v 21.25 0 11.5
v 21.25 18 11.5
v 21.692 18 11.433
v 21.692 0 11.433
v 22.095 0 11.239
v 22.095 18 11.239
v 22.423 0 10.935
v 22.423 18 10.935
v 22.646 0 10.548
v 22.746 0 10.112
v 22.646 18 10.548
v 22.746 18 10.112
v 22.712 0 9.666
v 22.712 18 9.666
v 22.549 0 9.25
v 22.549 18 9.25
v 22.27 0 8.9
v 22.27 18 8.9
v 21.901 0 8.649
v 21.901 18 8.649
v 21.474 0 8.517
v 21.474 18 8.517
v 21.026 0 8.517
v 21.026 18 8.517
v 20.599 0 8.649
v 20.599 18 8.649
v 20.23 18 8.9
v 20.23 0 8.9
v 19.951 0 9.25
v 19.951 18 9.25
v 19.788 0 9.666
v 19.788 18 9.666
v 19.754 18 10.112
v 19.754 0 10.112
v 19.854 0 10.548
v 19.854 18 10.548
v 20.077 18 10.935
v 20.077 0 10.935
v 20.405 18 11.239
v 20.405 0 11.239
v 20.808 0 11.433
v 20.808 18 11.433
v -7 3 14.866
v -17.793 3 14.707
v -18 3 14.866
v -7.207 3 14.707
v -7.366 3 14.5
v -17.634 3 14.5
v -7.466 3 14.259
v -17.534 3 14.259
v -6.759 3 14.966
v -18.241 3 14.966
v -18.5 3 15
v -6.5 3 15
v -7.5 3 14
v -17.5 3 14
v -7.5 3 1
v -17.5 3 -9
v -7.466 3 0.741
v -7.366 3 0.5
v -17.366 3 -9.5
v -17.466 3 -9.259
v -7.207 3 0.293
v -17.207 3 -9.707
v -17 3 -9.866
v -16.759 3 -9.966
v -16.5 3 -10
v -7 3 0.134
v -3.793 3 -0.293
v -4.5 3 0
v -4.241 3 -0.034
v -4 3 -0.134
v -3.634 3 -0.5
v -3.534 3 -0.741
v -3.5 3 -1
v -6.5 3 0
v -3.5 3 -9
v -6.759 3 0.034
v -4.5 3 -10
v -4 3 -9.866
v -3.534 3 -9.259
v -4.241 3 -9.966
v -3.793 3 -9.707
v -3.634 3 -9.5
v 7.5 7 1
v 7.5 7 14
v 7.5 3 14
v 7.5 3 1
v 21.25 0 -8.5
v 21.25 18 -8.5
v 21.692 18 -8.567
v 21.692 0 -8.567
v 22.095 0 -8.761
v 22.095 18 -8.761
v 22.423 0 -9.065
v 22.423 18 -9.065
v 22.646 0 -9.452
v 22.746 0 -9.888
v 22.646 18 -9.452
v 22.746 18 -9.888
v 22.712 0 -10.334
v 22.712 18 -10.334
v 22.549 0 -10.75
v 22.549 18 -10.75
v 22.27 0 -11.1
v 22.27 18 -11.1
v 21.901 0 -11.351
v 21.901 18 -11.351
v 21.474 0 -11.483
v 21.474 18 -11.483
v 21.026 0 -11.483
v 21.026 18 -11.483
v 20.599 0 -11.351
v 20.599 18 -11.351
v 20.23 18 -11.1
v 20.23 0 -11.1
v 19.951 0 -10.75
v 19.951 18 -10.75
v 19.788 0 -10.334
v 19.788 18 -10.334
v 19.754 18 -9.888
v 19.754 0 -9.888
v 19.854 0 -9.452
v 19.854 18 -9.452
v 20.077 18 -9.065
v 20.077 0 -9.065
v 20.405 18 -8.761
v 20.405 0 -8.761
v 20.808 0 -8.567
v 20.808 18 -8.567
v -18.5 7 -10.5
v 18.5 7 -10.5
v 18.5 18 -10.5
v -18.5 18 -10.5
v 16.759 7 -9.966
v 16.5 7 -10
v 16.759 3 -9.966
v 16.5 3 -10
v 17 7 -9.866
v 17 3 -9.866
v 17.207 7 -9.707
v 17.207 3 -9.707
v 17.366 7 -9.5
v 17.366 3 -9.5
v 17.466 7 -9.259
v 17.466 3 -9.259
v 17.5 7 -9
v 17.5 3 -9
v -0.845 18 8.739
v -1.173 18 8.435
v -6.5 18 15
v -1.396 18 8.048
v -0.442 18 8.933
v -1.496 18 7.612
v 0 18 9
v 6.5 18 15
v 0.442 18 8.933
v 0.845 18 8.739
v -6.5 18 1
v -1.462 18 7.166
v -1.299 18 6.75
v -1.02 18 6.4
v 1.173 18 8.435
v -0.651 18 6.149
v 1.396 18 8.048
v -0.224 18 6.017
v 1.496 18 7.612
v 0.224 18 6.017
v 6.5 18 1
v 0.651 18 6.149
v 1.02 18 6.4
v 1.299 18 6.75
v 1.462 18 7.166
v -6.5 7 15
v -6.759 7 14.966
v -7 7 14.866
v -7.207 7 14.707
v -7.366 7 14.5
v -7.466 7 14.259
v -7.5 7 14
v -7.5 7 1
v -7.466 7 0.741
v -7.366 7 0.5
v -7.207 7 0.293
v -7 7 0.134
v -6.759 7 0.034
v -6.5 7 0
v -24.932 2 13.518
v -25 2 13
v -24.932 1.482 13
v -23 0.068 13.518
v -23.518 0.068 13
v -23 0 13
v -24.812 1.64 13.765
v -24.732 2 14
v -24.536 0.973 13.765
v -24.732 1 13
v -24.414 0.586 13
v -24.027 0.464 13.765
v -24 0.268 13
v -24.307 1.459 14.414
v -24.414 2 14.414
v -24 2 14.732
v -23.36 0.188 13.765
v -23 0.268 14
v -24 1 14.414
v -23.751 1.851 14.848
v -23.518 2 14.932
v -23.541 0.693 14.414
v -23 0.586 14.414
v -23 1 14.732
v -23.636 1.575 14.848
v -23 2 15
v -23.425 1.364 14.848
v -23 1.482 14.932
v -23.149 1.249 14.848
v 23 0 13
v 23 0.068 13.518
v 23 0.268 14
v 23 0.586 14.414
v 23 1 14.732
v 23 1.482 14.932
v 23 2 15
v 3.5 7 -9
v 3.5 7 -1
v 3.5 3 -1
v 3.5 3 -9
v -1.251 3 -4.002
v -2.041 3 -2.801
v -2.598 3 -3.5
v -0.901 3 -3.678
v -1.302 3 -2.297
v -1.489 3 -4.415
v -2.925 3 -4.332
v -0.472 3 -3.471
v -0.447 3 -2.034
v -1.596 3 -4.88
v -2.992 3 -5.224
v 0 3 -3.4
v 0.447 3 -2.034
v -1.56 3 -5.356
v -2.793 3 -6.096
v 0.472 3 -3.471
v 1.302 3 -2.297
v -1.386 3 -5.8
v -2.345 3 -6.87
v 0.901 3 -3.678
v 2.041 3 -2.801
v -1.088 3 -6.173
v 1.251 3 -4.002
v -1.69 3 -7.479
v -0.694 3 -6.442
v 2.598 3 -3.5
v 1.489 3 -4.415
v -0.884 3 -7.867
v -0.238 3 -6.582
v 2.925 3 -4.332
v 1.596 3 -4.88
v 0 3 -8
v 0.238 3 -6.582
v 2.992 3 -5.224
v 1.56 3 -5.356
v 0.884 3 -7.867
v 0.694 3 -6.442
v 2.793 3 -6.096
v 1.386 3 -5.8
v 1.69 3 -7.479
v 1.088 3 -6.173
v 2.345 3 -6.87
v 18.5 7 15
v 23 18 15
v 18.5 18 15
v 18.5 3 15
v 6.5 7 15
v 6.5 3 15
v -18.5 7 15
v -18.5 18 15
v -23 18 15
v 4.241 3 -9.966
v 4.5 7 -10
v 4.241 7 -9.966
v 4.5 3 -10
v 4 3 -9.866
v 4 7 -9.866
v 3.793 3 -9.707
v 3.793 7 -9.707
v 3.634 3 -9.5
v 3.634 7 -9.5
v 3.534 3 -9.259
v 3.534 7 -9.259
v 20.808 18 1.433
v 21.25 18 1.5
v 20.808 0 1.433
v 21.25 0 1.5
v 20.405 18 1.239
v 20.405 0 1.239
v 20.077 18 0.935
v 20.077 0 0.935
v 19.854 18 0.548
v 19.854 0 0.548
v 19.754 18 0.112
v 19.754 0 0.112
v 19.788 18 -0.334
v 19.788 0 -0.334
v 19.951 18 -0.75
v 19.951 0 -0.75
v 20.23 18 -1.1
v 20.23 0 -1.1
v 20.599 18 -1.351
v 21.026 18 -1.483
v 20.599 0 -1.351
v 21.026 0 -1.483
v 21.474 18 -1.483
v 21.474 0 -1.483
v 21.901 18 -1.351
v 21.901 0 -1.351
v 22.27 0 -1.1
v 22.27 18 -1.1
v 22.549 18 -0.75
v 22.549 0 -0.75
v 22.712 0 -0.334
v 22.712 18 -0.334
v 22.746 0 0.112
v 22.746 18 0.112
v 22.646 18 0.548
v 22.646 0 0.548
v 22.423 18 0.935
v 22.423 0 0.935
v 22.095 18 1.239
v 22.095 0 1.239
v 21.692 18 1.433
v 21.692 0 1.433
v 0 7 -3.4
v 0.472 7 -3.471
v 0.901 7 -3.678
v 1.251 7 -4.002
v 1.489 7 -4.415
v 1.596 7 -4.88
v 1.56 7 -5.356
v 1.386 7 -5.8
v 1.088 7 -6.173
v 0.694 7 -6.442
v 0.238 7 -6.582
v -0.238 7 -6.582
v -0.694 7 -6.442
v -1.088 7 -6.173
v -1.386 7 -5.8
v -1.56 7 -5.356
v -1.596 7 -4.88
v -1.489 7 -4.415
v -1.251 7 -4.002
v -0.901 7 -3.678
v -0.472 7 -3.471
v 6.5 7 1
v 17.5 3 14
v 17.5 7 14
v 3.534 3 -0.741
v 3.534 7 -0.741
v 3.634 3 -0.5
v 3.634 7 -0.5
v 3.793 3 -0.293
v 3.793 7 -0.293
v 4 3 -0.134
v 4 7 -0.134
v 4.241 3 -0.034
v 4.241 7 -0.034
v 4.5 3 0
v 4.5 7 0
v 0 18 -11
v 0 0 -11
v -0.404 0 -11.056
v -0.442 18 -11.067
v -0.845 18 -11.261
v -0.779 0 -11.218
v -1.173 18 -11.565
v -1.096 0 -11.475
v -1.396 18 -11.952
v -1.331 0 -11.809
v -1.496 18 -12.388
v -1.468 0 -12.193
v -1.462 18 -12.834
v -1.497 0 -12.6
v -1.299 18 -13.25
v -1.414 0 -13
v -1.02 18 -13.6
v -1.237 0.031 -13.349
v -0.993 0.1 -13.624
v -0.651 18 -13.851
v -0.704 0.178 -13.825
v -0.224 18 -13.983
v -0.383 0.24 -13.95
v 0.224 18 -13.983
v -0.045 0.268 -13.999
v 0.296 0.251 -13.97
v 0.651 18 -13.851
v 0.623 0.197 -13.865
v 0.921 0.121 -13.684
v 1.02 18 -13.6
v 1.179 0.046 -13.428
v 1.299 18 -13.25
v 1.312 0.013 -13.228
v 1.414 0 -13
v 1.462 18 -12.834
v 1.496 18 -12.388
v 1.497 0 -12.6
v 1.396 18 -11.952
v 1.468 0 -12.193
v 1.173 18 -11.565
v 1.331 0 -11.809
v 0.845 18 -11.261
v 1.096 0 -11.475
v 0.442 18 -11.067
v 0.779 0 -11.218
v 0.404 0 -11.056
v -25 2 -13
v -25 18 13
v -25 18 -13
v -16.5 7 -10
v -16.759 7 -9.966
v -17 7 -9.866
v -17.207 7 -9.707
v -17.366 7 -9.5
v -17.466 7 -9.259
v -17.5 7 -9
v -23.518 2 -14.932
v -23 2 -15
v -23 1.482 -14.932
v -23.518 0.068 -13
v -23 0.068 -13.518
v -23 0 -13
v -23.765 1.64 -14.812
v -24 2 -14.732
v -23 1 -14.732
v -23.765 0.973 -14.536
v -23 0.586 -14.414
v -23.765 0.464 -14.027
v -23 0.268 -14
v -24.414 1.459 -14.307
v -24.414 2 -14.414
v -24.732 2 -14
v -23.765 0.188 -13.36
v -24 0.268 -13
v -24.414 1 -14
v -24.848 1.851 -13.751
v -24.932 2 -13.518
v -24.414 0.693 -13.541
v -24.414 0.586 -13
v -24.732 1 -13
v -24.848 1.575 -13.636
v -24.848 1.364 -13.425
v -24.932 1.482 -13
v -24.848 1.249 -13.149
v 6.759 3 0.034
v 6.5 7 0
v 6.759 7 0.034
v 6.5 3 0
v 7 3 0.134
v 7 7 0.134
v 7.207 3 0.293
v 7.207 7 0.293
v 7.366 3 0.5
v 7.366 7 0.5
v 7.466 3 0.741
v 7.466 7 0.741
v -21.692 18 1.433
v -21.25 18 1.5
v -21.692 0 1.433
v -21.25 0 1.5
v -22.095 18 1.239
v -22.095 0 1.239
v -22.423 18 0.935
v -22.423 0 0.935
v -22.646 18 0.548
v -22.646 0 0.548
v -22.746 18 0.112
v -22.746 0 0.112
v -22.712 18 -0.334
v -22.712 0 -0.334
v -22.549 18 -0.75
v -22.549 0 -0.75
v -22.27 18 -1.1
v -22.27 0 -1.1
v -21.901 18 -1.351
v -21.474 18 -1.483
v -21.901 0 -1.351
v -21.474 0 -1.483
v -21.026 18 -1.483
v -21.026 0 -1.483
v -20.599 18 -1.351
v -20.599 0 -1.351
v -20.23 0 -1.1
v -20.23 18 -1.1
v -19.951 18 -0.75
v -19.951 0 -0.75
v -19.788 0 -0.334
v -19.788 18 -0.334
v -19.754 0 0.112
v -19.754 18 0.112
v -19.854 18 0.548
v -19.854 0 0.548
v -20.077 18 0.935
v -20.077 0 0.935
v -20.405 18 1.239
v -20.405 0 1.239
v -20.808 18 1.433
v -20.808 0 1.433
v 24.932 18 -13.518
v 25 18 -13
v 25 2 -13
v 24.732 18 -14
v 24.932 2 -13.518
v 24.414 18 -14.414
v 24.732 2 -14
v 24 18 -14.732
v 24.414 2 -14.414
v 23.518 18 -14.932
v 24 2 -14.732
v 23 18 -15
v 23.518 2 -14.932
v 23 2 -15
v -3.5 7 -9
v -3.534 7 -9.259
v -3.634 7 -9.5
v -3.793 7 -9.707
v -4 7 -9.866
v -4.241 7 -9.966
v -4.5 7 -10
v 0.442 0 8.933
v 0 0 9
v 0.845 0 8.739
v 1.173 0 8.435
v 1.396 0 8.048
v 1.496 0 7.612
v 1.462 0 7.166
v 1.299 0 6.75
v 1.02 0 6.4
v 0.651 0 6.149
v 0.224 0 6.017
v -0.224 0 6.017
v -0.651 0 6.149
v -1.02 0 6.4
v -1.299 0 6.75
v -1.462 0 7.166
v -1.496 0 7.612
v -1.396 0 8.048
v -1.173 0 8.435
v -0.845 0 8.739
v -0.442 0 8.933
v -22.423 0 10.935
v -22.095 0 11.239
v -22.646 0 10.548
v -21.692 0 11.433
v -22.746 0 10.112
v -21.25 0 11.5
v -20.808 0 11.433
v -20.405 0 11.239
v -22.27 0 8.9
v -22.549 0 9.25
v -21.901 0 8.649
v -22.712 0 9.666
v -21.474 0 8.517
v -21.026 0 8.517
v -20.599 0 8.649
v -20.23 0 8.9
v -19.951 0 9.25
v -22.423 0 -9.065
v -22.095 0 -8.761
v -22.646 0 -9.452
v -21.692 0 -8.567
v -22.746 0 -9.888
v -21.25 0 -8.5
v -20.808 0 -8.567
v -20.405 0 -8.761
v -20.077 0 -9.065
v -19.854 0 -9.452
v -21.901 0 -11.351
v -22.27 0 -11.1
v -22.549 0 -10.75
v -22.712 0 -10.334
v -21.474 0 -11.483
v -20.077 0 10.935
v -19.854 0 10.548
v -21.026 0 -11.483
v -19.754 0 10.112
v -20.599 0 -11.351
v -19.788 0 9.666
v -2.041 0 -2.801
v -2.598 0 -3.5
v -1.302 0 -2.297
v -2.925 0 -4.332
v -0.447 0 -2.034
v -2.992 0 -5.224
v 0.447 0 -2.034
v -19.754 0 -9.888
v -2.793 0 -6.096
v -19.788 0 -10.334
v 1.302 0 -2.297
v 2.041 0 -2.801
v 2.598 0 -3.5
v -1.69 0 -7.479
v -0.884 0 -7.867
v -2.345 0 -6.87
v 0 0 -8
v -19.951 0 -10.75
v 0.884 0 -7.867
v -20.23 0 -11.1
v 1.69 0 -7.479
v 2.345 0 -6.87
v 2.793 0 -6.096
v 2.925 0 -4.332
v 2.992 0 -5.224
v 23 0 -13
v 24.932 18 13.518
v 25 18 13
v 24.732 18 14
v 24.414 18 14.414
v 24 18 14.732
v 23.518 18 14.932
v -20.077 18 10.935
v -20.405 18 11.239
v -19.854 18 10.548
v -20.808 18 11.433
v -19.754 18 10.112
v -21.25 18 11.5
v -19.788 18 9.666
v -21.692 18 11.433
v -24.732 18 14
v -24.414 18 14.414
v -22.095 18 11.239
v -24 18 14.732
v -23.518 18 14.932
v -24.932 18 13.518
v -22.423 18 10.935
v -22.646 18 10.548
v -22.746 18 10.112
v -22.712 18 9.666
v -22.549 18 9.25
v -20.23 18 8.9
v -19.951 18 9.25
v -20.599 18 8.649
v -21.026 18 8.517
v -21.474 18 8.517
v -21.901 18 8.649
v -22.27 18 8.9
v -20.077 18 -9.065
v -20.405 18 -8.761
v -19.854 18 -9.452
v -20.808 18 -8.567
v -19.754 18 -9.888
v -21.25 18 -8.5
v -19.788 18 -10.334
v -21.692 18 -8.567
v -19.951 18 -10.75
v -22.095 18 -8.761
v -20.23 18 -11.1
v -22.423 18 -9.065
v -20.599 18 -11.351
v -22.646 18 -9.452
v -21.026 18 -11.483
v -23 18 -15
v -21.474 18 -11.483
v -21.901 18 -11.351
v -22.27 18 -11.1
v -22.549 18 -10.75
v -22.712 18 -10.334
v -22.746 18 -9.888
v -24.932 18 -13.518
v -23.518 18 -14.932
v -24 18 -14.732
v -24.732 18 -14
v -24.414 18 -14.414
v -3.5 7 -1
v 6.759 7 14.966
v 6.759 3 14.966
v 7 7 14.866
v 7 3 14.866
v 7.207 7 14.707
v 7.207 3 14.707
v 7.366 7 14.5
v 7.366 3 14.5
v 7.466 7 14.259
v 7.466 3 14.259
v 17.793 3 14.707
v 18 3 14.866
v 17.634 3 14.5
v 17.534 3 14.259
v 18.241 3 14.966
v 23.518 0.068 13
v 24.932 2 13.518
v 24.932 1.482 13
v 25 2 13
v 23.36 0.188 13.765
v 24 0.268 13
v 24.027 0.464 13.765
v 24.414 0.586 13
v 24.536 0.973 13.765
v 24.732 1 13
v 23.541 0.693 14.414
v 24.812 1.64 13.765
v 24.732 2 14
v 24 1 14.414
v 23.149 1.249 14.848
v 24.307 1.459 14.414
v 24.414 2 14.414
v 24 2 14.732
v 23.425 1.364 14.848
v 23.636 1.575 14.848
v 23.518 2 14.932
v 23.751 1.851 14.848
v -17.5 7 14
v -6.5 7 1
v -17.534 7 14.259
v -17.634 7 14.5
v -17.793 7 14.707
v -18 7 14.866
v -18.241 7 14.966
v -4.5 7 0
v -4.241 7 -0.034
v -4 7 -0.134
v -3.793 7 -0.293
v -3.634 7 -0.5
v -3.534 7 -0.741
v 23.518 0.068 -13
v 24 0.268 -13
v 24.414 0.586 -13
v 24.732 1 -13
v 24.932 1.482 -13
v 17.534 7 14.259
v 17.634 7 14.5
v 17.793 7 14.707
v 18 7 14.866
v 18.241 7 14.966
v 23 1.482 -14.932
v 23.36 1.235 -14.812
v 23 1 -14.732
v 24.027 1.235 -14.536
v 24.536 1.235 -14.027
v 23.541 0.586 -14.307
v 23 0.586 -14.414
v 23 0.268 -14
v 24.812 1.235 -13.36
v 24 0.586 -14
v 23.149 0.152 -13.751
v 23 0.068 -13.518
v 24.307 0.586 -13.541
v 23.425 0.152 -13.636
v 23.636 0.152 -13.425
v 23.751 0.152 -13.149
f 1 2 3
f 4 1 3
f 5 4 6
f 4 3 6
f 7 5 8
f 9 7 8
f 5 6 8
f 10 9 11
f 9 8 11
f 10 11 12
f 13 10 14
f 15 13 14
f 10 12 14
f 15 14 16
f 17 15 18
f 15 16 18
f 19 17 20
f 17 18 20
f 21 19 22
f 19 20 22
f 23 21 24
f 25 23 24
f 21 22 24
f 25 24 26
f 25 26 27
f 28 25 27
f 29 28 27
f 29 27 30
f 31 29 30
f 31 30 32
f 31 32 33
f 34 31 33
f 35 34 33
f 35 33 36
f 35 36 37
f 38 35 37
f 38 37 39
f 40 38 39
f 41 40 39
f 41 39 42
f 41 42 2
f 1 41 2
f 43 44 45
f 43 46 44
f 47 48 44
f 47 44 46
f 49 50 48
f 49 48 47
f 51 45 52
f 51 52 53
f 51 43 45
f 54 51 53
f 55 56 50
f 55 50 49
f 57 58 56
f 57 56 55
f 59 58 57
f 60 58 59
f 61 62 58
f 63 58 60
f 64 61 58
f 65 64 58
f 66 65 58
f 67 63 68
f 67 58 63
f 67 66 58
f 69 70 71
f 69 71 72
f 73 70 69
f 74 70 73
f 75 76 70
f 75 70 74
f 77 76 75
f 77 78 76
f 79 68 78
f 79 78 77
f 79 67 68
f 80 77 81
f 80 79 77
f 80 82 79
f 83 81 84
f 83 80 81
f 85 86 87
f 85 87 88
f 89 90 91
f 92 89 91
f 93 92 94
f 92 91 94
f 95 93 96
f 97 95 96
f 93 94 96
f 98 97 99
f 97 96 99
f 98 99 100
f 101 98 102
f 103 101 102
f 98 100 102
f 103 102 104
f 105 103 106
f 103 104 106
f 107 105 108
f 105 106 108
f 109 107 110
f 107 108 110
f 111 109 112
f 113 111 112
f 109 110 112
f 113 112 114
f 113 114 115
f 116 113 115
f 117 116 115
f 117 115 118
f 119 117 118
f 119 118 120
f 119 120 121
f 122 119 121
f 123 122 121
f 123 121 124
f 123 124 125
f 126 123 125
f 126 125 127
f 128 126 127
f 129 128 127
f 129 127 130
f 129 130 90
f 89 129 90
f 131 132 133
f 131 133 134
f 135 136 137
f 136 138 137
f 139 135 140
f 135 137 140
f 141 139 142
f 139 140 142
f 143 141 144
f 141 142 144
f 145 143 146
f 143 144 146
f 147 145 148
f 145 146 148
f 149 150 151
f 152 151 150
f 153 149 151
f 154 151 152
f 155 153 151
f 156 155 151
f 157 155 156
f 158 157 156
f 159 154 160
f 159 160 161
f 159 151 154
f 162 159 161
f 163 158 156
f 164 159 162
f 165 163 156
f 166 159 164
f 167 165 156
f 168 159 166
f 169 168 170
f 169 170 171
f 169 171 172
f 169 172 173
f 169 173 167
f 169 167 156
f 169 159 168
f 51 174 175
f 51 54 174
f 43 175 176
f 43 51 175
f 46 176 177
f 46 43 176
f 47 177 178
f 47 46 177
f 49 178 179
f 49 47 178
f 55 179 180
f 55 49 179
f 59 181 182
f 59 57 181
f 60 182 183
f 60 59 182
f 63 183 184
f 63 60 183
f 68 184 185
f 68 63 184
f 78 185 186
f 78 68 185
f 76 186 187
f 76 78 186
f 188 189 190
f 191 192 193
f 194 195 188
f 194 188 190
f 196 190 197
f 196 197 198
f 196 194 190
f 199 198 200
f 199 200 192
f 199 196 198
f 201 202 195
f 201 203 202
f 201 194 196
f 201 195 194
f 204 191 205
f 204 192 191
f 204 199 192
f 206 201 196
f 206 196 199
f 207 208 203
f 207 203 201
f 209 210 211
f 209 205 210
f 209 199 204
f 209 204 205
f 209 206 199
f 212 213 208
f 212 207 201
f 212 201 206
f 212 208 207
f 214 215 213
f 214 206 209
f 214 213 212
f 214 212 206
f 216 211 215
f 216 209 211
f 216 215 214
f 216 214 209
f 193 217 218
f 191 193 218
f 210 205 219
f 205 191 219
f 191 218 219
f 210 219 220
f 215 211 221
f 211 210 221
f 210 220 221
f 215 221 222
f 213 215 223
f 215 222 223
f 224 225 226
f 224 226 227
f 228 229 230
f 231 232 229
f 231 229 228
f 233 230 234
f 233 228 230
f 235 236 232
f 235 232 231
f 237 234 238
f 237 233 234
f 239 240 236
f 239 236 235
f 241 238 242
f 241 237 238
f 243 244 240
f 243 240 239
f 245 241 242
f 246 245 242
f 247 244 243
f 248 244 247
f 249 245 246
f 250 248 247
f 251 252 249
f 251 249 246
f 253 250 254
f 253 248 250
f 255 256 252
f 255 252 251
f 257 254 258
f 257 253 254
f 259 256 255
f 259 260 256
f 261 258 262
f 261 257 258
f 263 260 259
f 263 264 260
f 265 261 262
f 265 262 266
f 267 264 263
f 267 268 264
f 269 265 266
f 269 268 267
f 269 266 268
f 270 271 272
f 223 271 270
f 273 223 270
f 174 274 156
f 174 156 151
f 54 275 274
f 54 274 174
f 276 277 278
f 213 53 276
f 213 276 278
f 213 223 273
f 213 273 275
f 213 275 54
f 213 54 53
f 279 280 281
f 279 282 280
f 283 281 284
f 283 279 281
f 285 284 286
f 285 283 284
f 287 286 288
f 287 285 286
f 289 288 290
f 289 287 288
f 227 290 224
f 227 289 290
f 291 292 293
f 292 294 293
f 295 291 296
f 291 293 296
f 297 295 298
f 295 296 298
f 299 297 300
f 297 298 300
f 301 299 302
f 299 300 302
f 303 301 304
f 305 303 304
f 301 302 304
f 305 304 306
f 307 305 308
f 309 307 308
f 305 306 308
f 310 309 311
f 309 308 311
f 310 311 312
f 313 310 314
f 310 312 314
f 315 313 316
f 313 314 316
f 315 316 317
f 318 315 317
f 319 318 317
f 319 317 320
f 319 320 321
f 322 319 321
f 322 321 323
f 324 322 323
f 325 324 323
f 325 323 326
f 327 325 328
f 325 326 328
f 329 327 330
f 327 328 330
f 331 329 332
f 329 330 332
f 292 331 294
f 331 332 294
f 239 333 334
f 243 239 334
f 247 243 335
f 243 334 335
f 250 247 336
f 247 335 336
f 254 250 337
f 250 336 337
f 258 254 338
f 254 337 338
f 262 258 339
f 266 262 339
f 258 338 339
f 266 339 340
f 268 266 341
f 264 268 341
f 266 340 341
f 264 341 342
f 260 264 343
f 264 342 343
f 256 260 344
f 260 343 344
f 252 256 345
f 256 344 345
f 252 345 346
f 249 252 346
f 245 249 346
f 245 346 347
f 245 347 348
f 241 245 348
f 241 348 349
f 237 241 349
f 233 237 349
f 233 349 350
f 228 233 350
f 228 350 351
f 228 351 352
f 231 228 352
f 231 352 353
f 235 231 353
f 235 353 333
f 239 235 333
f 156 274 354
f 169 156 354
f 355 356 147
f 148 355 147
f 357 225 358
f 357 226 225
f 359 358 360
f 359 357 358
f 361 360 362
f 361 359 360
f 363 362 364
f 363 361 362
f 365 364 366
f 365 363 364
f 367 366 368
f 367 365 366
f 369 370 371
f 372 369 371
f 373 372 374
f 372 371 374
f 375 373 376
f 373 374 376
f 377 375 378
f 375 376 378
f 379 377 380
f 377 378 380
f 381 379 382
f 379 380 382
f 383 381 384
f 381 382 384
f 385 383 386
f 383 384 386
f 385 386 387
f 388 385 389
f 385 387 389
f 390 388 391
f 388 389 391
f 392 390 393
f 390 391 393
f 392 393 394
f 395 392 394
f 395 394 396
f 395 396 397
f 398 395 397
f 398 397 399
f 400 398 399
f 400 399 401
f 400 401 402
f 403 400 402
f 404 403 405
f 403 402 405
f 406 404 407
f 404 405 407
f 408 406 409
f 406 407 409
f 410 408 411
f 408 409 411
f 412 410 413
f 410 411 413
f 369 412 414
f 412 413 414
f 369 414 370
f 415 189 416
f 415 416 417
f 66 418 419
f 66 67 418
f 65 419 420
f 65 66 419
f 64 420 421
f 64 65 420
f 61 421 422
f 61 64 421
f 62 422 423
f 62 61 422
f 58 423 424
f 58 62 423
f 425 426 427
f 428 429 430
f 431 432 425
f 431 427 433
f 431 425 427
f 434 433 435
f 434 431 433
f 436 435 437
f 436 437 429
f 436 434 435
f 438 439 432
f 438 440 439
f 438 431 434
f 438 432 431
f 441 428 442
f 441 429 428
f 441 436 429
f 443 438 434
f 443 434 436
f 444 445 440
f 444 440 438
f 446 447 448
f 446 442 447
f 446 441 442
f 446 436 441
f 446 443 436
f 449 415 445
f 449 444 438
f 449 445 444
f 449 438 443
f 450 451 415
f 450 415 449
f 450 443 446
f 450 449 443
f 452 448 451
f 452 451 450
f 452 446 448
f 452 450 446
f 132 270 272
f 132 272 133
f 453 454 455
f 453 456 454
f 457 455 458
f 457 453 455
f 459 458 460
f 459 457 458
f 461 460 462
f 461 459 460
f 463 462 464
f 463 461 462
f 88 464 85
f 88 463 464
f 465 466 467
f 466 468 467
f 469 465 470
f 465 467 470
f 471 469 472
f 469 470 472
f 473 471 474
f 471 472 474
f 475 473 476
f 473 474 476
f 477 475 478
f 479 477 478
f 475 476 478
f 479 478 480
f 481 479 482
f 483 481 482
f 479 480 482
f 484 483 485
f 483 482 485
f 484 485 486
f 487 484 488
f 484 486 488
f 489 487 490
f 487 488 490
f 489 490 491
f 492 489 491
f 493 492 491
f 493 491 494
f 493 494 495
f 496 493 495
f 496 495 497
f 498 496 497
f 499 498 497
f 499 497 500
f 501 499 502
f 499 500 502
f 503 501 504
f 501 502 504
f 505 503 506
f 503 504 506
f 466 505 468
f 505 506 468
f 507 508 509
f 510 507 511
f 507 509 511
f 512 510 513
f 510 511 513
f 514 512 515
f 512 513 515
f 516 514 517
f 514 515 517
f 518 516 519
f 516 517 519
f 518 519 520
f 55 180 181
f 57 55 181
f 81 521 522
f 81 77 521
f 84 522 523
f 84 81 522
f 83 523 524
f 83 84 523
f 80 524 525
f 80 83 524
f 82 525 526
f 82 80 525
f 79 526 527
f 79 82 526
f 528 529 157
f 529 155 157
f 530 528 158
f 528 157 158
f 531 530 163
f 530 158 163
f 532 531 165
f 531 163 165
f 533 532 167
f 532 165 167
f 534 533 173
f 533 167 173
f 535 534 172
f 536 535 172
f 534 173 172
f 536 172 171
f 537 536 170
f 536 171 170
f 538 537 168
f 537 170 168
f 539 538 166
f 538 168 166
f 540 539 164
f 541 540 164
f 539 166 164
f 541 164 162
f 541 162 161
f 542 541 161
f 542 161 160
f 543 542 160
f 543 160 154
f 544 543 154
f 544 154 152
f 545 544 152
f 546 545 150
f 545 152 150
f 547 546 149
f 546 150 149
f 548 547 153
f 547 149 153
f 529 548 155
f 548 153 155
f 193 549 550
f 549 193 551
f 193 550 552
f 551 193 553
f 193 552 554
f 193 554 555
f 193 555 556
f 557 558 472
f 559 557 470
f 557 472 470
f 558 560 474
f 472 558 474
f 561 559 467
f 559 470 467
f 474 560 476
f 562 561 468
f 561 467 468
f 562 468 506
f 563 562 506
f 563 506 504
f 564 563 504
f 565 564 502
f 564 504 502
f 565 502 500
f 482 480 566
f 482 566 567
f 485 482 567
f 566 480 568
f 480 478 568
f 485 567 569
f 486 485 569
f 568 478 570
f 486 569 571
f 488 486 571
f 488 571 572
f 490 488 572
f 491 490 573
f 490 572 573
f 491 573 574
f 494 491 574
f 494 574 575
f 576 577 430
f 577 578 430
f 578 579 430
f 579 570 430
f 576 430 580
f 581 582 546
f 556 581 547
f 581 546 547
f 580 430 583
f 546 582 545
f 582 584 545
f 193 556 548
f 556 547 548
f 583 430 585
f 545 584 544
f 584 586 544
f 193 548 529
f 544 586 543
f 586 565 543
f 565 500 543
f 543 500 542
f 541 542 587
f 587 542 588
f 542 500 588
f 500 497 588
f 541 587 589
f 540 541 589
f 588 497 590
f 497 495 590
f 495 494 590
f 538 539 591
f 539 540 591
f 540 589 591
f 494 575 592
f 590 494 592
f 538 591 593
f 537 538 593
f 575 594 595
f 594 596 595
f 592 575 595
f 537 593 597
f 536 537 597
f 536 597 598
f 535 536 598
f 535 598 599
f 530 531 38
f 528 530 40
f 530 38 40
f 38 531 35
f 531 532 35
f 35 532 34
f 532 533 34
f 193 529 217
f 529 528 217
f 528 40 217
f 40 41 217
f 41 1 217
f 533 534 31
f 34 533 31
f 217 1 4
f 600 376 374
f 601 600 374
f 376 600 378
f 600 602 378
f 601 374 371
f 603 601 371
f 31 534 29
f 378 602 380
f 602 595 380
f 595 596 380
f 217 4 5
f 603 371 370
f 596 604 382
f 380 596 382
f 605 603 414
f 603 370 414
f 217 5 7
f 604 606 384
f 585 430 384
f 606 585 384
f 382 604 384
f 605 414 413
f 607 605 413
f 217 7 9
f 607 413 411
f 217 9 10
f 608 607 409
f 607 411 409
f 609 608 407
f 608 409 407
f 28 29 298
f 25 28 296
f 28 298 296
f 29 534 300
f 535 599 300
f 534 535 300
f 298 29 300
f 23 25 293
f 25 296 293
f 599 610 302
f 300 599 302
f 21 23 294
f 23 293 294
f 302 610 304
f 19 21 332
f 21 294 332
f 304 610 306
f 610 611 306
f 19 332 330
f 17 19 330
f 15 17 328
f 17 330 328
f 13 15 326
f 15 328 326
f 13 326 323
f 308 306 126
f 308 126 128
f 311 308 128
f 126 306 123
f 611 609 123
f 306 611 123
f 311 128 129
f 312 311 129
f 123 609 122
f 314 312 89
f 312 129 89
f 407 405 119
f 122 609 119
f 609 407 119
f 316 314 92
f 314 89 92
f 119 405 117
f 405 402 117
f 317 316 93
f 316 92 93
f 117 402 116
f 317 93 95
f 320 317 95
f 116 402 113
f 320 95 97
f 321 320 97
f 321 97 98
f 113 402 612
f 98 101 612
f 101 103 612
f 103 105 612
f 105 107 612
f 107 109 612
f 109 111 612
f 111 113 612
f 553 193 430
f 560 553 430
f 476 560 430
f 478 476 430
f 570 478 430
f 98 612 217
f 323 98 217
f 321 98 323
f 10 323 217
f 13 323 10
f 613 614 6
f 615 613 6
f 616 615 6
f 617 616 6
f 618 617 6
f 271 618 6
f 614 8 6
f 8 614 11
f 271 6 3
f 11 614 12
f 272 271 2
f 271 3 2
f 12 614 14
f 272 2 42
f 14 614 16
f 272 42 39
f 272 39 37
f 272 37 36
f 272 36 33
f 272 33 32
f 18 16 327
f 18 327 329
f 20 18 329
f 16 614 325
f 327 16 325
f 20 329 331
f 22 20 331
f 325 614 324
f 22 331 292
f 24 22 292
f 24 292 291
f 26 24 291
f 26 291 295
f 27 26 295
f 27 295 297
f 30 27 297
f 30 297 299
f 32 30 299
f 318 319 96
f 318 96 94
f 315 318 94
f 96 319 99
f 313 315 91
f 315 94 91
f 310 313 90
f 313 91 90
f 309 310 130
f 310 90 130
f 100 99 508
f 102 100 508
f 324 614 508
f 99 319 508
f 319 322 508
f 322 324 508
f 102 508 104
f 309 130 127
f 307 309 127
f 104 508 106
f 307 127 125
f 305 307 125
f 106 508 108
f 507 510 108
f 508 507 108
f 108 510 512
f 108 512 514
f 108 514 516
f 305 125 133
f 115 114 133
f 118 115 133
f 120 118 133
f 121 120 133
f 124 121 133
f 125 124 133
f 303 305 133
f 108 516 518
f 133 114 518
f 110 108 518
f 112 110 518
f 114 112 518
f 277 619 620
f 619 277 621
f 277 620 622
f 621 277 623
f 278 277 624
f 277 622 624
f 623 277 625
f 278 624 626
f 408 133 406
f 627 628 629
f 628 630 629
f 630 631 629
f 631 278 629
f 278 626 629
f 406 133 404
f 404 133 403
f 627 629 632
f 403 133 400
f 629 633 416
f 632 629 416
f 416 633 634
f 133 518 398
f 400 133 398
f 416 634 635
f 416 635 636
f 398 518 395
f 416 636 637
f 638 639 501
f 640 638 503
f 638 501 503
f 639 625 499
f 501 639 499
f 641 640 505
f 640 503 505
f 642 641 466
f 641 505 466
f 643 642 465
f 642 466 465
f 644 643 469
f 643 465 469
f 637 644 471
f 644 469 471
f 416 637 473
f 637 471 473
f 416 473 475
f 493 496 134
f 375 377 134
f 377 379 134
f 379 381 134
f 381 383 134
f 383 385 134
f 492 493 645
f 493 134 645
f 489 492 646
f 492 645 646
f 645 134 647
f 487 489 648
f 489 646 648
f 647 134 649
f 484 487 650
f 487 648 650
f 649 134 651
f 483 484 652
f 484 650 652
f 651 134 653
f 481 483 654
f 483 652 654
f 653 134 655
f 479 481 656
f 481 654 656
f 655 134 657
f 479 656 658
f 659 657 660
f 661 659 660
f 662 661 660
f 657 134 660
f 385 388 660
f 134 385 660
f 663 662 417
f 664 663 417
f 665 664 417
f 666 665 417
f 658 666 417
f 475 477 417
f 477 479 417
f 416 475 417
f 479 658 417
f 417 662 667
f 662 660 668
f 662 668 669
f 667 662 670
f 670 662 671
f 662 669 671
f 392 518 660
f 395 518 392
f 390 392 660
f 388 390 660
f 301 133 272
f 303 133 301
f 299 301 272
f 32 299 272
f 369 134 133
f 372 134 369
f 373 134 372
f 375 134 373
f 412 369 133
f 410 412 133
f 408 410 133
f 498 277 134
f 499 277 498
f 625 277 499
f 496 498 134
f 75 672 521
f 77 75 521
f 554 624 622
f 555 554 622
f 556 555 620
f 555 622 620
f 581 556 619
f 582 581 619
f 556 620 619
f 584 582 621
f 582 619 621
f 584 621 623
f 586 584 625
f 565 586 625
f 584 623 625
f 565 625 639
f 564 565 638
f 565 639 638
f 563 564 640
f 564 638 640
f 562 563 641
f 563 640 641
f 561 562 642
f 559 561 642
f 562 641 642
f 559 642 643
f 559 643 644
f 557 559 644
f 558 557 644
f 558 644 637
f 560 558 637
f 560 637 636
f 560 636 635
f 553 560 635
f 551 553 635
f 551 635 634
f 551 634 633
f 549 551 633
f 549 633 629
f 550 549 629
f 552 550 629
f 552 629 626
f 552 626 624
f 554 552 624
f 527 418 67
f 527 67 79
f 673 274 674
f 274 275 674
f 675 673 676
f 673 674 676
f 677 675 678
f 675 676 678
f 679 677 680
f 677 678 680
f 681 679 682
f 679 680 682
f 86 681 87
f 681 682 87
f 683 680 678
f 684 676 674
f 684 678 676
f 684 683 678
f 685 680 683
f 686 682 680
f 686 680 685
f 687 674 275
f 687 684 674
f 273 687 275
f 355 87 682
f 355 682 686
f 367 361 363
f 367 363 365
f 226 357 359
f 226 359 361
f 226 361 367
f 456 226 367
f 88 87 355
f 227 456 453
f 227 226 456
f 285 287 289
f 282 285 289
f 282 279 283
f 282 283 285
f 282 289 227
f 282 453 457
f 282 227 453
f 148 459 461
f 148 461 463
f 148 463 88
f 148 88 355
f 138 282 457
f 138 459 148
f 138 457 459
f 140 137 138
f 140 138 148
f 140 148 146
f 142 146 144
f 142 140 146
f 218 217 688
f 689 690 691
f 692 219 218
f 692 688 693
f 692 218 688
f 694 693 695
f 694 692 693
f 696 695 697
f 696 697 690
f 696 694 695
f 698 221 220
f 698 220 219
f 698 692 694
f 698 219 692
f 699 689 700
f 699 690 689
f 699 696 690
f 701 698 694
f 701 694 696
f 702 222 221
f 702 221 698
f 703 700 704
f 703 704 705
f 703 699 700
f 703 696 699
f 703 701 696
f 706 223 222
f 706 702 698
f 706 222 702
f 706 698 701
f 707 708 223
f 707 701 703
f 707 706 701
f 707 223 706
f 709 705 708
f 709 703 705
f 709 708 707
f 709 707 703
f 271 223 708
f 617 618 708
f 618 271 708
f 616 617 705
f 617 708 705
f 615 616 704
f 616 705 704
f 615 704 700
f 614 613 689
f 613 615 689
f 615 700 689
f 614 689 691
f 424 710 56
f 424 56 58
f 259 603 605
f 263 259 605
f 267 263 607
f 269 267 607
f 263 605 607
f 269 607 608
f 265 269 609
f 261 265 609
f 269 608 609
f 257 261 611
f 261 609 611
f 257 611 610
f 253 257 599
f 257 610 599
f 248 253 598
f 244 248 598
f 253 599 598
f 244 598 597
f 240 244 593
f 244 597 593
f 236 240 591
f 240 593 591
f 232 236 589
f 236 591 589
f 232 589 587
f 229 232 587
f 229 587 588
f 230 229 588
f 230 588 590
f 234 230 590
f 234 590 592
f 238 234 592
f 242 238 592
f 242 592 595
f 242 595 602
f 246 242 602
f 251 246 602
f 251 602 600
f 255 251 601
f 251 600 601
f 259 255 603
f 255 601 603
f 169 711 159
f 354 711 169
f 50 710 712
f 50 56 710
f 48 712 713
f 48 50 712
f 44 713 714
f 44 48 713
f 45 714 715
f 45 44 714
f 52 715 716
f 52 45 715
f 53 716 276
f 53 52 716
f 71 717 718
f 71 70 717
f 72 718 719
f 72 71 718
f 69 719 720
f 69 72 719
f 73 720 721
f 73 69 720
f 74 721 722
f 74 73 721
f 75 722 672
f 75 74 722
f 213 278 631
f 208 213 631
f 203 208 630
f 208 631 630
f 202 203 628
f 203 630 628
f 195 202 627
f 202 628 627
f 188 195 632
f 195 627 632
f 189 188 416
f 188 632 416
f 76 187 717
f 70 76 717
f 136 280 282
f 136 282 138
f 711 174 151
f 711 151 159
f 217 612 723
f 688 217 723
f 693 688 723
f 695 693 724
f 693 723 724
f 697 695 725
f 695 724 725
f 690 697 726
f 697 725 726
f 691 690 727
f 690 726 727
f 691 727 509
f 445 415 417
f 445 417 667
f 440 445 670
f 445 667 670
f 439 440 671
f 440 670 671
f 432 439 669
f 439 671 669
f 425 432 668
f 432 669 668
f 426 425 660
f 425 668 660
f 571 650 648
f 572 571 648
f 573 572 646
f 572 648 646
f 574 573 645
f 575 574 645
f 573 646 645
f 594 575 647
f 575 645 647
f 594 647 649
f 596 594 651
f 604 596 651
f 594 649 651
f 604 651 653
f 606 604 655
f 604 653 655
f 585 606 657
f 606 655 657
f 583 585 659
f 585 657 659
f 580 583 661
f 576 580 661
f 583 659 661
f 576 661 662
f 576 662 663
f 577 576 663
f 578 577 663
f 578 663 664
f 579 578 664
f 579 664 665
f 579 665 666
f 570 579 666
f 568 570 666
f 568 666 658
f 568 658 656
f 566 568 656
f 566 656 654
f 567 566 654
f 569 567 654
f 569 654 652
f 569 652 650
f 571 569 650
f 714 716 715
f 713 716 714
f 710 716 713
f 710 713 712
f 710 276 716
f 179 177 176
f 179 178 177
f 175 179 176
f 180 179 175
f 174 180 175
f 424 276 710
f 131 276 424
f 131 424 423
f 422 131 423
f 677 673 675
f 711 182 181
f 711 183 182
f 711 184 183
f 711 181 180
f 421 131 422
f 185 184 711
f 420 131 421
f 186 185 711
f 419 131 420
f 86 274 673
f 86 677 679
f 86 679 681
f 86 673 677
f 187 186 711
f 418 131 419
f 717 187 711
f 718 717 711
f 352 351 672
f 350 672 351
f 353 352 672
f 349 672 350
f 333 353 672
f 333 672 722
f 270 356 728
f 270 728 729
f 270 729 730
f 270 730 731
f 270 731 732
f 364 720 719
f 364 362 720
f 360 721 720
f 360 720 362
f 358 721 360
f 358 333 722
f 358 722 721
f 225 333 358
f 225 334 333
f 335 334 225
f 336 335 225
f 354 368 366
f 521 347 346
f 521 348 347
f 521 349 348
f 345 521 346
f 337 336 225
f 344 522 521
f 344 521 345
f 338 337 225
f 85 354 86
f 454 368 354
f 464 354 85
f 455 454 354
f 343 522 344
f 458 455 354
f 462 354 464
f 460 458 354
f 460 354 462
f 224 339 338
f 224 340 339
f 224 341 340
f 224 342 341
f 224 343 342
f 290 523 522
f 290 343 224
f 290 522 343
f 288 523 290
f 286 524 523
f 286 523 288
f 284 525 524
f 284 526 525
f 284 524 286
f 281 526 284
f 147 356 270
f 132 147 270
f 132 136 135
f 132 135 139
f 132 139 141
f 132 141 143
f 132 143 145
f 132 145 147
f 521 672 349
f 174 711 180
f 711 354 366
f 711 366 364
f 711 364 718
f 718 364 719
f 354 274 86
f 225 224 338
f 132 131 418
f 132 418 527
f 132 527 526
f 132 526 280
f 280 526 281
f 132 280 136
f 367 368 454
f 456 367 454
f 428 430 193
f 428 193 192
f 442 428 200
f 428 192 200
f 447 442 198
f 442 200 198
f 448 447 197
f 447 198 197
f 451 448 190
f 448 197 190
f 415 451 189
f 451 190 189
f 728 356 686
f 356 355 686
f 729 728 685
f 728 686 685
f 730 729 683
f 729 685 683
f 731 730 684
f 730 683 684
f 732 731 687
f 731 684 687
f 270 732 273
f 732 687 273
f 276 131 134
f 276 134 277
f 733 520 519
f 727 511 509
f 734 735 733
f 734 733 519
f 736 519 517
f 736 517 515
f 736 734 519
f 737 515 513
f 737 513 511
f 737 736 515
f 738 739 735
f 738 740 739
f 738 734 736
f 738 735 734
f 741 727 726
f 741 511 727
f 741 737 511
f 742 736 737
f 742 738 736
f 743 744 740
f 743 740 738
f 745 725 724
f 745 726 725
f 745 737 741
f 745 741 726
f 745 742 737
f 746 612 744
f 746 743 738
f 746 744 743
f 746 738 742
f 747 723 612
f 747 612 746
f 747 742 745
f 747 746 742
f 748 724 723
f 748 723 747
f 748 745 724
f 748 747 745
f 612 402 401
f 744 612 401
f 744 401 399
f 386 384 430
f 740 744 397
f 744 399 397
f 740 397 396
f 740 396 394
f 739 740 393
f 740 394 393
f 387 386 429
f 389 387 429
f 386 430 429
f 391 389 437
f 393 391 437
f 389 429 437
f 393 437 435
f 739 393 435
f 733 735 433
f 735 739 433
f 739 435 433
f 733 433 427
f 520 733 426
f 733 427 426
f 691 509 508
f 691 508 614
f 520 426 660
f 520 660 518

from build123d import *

# Parameters (mm, degrees)
SKETCH_1_W          = 50
SKETCH_1_H          = 30
EXTRUDE_1_DEPTH     = 7
SKETCH_2_W          = 10
SKETCH_2_H          = 25
CUT_EXTRUDE_1_DEPTH = 4
SKETCH_4_R          = 1.6
CUT_EXTRUDE_3_DEPTH = 30.983328701
SKETCH_5_R          = 3
CUT_EXTRUDE_4_DEPTH = 3
SKETCH_6_R          = 1.5
CUT_EXTRUDE_5_DEPTH = 30.983328701
SKETCH_7_W          = 13
SKETCH_7_H          = 14
EXTRUDE_6_DEPTH     = 11
SKETCH_8_R          = 1.5
CUT_EXTRUDE_6_DEPTH = 32.160872902
SKETCH_9_R          = 1.5
CUT_EXTRUDE_7_DEPTH = 35.263683398
FILLET_1_R          = 2
SKETCH_10_W         = 4
SKETCH_10_H         = 10
CUT_EXTRUDE_8_DEPTH = 4
FILLET_2_R          = 1
FILLET_3_R          = 1


with BuildPart() as part:
    # Эскиз1 → Бобышка-Вытянуть1 (new body)
    with BuildSketch(Plane(origin=(0, 0, 0), x_dir=(1, 0, 0), z_dir=(0, 1, 0))):
        Rectangle(SKETCH_1_W, SKETCH_1_H)
    extrude(amount=EXTRUDE_1_DEPTH)

    # Эскиз2 → Вырез-Вытянуть1 (cut)
    with BuildSketch(Plane(origin=(0, 7, 0), x_dir=(1, 0, 0), z_dir=(0, 1, 0))):
        with Locations((-12.5, -2.5)):
            Rectangle(SKETCH_2_W, SKETCH_2_H)
        with Locations((12.5, -2.5)):
            Rectangle(SKETCH_2_W, SKETCH_2_H)
    extrude(amount=-CUT_EXTRUDE_1_DEPTH, mode=Mode.SUBTRACT)

    # Эскиз4 → Вырез-Вытянуть3 (cut, through all)
    with BuildSketch(Plane(origin=(0, 7, 0), x_dir=(1, 0, 0), z_dir=(0, 1, 0))):
        with Locations(Location((0, 5, 0), (0, 0, 270))):
            Circle(SKETCH_4_R)
    extrude(amount=-CUT_EXTRUDE_3_DEPTH, mode=Mode.SUBTRACT)

    # Эскиз5 → Вырез-Вытянуть4 (cut)
    with BuildSketch(Plane.XZ):
        with Locations(Location((0, -5, 0), (0, 0, 270))):
            Circle(SKETCH_5_R)
    extrude(amount=-CUT_EXTRUDE_4_DEPTH, mode=Mode.SUBTRACT)

    # Эскиз6 → Вырез-Вытянуть5 (cut, through all)
    with BuildSketch(Plane(origin=(0, 7, 0), x_dir=(1, 0, 0), z_dir=(0, 1, 0))):
        with Locations(Location((-21.25, 0, 0), (0, 0, 270))):
            Circle(SKETCH_6_R)
        with Locations(Location((0, 12.5, 0), (0, 0, 270))):
            Circle(SKETCH_6_R)
        with Locations(Location((21.25, 0, 0), (0, 0, 270))):
            Circle(SKETCH_6_R)
        with Locations(Location((0, -7.5, 0), (0, 0, 270))):
            Circle(SKETCH_6_R)
    extrude(amount=-CUT_EXTRUDE_5_DEPTH, mode=Mode.SUBTRACT)

    # Эскиз7 → Бобышка-Вытянуть6 (add)
    with BuildSketch(Plane(origin=(0, 7, 0), x_dir=(1, 0, 0), z_dir=(0, 1, 0))):
        Polygon((-25, 15), (25, 15), (25, -15), (18.5, -15), (18.5, 10.5), (-18.5, 10.5), (-18.5, -15), (-25, -15), align=None)
        with Locations((0, -8)):
            Rectangle(SKETCH_7_W, SKETCH_7_H)
    extrude(amount=EXTRUDE_6_DEPTH)

    # Эскиз8 → Вырез-Вытянуть6 (cut, through all)
    with BuildSketch(Plane.XZ.offset(-7)):
        with Locations(Location((21.25, 0, 0), (0, 0, 90))):
            Circle(SKETCH_8_R)
        with Locations(Location((0, 7.5, 0), (0, 0, 90))):
            Circle(SKETCH_8_R)
        with Locations(Location((-21.25, 0, 0), (0, 0, 90))):
            Circle(SKETCH_8_R)
        with Locations(Location((0, -12.5, 0), (0, 0, 90))):
            Circle(SKETCH_8_R)
    extrude(amount=-CUT_EXTRUDE_6_DEPTH, mode=Mode.SUBTRACT)

    # Эскиз9 → Вырез-Вытянуть7 (cut, through all)
    with BuildSketch(Plane(origin=(0, 18, 0), x_dir=(1, 0, 0), z_dir=(0, 1, 0))):
        with Locations(Location((-21.25, 10, 0), (0, 0, 270))):
            Circle(SKETCH_9_R)
        with Locations(Location((21.25, 10, 0), (0, 0, 270))):
            Circle(SKETCH_9_R)
        with Locations(Location((21.25, -10, 0), (0, 0, 270))):
            Circle(SKETCH_9_R)
        with Locations(Location((-21.25, -10, 0), (0, 0, 270))):
            Circle(SKETCH_9_R)
    extrude(amount=-CUT_EXTRUDE_7_DEPTH, mode=Mode.SUBTRACT)

    # Скругление1
    # the kernel refuses this fillet: 2 mm, written as the material it takes off along each edge
    with BuildSketch(Plane(origin=(-23, 2, -13), x_dir=(0, -1, 0), z_dir=(-1, 0, 0))) as fillet_1_piece_1_section:
        Polygon((0, 0), (FILLET_1_R, 0), (FILLET_1_R, -FILLET_1_R), (0, -FILLET_1_R), align=None)
    fillet_1_piece_1 = extrude(amount=FILLET_1_R, mode=Mode.PRIVATE)
    fillet_1_piece_1 = fillet_1_piece_1 - Plane(origin=(-23, 2, -13), x_dir=(0, 0.7071067811865475, 0.7071067811865475), z_dir=(-1, 0, 0)) * Sphere(FILLET_1_R, mode=Mode.PRIVATE)
    add(fillet_1_piece_1, mode=Mode.SUBTRACT)
    with BuildSketch(Plane(origin=(23, 2, -13), x_dir=(1, 0, 0), z_dir=(0, -1, 0))) as fillet_1_piece_2_section:
        Polygon((0, 0), (FILLET_1_R, 0), (FILLET_1_R, -FILLET_1_R), (0, -FILLET_1_R), align=None)
    fillet_1_piece_2 = extrude(amount=FILLET_1_R, mode=Mode.PRIVATE)
    fillet_1_piece_2 = fillet_1_piece_2 - Plane(origin=(23, 2, -13), x_dir=(-0.7071067811865474, 0, 0.7071067811865477), z_dir=(0, -1, 0)) * Sphere(FILLET_1_R, mode=Mode.PRIVATE)
    add(fillet_1_piece_2, mode=Mode.SUBTRACT)
    with BuildSketch(Plane(origin=(23, 2, 13), x_dir=(0, -1, 0), z_dir=(0, 0, 1))) as fillet_1_piece_3_section:
        Polygon((0, 0), (FILLET_1_R, 0), (FILLET_1_R, FILLET_1_R), (0, FILLET_1_R), align=None)
    fillet_1_piece_3 = extrude(amount=FILLET_1_R, mode=Mode.PRIVATE)
    fillet_1_piece_3 = fillet_1_piece_3 - Plane(origin=(23, 2, 13), x_dir=(-0.7071067811865475, 0.7071067811865475, 0), z_dir=(0, 0, 1)) * Sphere(FILLET_1_R, mode=Mode.PRIVATE)
    add(fillet_1_piece_3, mode=Mode.SUBTRACT)
    with BuildSketch(Plane(origin=(-23, 2, 13), x_dir=(0, -1, 0), z_dir=(0, 0, 1))) as fillet_1_piece_4_section:
        Polygon((0, 0), (FILLET_1_R, 0), (FILLET_1_R, -FILLET_1_R), (0, -FILLET_1_R), align=None)
    fillet_1_piece_4 = extrude(amount=FILLET_1_R, mode=Mode.PRIVATE)
    fillet_1_piece_4 = fillet_1_piece_4 - Plane(origin=(-23, 2, 13), x_dir=(0.7071067811865475, 0.7071067811865475, 0), z_dir=(0, 0, 1)) * Sphere(FILLET_1_R, mode=Mode.PRIVATE)
    add(fillet_1_piece_4, mode=Mode.SUBTRACT)
    with BuildSketch(Plane(origin=(-23, 0, -15), x_dir=(0, 0, 1), z_dir=(1, 0, 0))) as fillet_1_piece_5:
        with BuildLine():
            CenterArc((FILLET_1_R, -FILLET_1_R), FILLET_1_R, 90, 90)
            Line((0, -FILLET_1_R), (0, 0))
            Line((0, 0), (FILLET_1_R, 0))
        make_face()
    extrude(amount=46, mode=Mode.SUBTRACT)
    with BuildSketch(Plane(origin=(25, 0, -13), x_dir=(-1, 0, 0), z_dir=(0, 0, 1)), Plane(origin=(-25, 0, 13), x_dir=(1, 0, 0), z_dir=(0, 0, -1))) as fillet_1_piece_6:
        with BuildLine():
            CenterArc((FILLET_1_R, -FILLET_1_R), FILLET_1_R, 90, 90)
            Line((0, -FILLET_1_R), (0, 0))
            Line((0, 0), (FILLET_1_R, 0))
        make_face()
    extrude(amount=26, mode=Mode.SUBTRACT)
    with BuildSketch(Plane(origin=(23, 0, 15), x_dir=(0, 1, 0), z_dir=(-1, 0, 0))) as fillet_1_piece_7:
        with BuildLine():
            CenterArc((FILLET_1_R, FILLET_1_R), FILLET_1_R, 180, 90)
            Line((0, FILLET_1_R), (0, 0))
            Line((0, 0), (FILLET_1_R, 0))
        make_face()
    extrude(amount=46, mode=Mode.SUBTRACT)
    with BuildSketch(Plane(origin=(-25, 23, -15), x_dir=(0, 0, 1), z_dir=(0, -1, 0)), Plane(origin=(25, 2, -15), x_dir=(0, 0, 1), z_dir=(0, 1, 0)), Plane(origin=(25, 2, 15), x_dir=(-1, 0, 0), z_dir=(0, 1, 0)), Plane(origin=(-25, 23, 15), x_dir=(1, 0, 0), z_dir=(0, -1, 0))) as fillet_1_piece_8:
        with BuildLine():
            CenterArc((FILLET_1_R, -FILLET_1_R), FILLET_1_R, 90, 90)
            Line((0, -FILLET_1_R), (0, 0))
            Line((0, 0), (FILLET_1_R, 0))
        make_face()
    extrude(amount=21, mode=Mode.SUBTRACT)

    # Эскиз10 → Вырез-Вытянуть8 (cut)
    with BuildSketch(Plane(origin=(0, 7, 0), x_dir=(1, 0, 0), z_dir=(0, 1, 0))):
        with Locations((-5.5, 5)):
            Rectangle(SKETCH_10_W, SKETCH_10_H)
        with Locations((5.5, 5)):
            Rectangle(SKETCH_10_W, SKETCH_10_H)
    extrude(amount=-CUT_EXTRUDE_8_DEPTH, mode=Mode.SUBTRACT)

    # Скругление2
    fillet_2_edges = [part.edges().sort_by_distance(p)[0] for p in [
        (-7.5, 5, 0),
        (-3.5, 5, -10),
        (-3.5, 5, 0),
        (7.5, 5, 0),
        (3.5, 5, 0),
        (3.5, 5, -10),
    ]]
    fillet(fillet_2_edges, radius=FILLET_2_R)

    # Скругление3
    fillet_3_edges = [part.edges().sort_by_distance(p)[0] for p in [
        (17.5, 5, -10),
        (17.5, 5, 15),
        (7.5, 5, 15),
        (-7.5, 5, 15),
        (-17.5, 5, 15),
        (-17.5, 5, -10),
    ]]
    fillet(fillet_3_edges, radius=FILLET_3_R)


solid = part.part
